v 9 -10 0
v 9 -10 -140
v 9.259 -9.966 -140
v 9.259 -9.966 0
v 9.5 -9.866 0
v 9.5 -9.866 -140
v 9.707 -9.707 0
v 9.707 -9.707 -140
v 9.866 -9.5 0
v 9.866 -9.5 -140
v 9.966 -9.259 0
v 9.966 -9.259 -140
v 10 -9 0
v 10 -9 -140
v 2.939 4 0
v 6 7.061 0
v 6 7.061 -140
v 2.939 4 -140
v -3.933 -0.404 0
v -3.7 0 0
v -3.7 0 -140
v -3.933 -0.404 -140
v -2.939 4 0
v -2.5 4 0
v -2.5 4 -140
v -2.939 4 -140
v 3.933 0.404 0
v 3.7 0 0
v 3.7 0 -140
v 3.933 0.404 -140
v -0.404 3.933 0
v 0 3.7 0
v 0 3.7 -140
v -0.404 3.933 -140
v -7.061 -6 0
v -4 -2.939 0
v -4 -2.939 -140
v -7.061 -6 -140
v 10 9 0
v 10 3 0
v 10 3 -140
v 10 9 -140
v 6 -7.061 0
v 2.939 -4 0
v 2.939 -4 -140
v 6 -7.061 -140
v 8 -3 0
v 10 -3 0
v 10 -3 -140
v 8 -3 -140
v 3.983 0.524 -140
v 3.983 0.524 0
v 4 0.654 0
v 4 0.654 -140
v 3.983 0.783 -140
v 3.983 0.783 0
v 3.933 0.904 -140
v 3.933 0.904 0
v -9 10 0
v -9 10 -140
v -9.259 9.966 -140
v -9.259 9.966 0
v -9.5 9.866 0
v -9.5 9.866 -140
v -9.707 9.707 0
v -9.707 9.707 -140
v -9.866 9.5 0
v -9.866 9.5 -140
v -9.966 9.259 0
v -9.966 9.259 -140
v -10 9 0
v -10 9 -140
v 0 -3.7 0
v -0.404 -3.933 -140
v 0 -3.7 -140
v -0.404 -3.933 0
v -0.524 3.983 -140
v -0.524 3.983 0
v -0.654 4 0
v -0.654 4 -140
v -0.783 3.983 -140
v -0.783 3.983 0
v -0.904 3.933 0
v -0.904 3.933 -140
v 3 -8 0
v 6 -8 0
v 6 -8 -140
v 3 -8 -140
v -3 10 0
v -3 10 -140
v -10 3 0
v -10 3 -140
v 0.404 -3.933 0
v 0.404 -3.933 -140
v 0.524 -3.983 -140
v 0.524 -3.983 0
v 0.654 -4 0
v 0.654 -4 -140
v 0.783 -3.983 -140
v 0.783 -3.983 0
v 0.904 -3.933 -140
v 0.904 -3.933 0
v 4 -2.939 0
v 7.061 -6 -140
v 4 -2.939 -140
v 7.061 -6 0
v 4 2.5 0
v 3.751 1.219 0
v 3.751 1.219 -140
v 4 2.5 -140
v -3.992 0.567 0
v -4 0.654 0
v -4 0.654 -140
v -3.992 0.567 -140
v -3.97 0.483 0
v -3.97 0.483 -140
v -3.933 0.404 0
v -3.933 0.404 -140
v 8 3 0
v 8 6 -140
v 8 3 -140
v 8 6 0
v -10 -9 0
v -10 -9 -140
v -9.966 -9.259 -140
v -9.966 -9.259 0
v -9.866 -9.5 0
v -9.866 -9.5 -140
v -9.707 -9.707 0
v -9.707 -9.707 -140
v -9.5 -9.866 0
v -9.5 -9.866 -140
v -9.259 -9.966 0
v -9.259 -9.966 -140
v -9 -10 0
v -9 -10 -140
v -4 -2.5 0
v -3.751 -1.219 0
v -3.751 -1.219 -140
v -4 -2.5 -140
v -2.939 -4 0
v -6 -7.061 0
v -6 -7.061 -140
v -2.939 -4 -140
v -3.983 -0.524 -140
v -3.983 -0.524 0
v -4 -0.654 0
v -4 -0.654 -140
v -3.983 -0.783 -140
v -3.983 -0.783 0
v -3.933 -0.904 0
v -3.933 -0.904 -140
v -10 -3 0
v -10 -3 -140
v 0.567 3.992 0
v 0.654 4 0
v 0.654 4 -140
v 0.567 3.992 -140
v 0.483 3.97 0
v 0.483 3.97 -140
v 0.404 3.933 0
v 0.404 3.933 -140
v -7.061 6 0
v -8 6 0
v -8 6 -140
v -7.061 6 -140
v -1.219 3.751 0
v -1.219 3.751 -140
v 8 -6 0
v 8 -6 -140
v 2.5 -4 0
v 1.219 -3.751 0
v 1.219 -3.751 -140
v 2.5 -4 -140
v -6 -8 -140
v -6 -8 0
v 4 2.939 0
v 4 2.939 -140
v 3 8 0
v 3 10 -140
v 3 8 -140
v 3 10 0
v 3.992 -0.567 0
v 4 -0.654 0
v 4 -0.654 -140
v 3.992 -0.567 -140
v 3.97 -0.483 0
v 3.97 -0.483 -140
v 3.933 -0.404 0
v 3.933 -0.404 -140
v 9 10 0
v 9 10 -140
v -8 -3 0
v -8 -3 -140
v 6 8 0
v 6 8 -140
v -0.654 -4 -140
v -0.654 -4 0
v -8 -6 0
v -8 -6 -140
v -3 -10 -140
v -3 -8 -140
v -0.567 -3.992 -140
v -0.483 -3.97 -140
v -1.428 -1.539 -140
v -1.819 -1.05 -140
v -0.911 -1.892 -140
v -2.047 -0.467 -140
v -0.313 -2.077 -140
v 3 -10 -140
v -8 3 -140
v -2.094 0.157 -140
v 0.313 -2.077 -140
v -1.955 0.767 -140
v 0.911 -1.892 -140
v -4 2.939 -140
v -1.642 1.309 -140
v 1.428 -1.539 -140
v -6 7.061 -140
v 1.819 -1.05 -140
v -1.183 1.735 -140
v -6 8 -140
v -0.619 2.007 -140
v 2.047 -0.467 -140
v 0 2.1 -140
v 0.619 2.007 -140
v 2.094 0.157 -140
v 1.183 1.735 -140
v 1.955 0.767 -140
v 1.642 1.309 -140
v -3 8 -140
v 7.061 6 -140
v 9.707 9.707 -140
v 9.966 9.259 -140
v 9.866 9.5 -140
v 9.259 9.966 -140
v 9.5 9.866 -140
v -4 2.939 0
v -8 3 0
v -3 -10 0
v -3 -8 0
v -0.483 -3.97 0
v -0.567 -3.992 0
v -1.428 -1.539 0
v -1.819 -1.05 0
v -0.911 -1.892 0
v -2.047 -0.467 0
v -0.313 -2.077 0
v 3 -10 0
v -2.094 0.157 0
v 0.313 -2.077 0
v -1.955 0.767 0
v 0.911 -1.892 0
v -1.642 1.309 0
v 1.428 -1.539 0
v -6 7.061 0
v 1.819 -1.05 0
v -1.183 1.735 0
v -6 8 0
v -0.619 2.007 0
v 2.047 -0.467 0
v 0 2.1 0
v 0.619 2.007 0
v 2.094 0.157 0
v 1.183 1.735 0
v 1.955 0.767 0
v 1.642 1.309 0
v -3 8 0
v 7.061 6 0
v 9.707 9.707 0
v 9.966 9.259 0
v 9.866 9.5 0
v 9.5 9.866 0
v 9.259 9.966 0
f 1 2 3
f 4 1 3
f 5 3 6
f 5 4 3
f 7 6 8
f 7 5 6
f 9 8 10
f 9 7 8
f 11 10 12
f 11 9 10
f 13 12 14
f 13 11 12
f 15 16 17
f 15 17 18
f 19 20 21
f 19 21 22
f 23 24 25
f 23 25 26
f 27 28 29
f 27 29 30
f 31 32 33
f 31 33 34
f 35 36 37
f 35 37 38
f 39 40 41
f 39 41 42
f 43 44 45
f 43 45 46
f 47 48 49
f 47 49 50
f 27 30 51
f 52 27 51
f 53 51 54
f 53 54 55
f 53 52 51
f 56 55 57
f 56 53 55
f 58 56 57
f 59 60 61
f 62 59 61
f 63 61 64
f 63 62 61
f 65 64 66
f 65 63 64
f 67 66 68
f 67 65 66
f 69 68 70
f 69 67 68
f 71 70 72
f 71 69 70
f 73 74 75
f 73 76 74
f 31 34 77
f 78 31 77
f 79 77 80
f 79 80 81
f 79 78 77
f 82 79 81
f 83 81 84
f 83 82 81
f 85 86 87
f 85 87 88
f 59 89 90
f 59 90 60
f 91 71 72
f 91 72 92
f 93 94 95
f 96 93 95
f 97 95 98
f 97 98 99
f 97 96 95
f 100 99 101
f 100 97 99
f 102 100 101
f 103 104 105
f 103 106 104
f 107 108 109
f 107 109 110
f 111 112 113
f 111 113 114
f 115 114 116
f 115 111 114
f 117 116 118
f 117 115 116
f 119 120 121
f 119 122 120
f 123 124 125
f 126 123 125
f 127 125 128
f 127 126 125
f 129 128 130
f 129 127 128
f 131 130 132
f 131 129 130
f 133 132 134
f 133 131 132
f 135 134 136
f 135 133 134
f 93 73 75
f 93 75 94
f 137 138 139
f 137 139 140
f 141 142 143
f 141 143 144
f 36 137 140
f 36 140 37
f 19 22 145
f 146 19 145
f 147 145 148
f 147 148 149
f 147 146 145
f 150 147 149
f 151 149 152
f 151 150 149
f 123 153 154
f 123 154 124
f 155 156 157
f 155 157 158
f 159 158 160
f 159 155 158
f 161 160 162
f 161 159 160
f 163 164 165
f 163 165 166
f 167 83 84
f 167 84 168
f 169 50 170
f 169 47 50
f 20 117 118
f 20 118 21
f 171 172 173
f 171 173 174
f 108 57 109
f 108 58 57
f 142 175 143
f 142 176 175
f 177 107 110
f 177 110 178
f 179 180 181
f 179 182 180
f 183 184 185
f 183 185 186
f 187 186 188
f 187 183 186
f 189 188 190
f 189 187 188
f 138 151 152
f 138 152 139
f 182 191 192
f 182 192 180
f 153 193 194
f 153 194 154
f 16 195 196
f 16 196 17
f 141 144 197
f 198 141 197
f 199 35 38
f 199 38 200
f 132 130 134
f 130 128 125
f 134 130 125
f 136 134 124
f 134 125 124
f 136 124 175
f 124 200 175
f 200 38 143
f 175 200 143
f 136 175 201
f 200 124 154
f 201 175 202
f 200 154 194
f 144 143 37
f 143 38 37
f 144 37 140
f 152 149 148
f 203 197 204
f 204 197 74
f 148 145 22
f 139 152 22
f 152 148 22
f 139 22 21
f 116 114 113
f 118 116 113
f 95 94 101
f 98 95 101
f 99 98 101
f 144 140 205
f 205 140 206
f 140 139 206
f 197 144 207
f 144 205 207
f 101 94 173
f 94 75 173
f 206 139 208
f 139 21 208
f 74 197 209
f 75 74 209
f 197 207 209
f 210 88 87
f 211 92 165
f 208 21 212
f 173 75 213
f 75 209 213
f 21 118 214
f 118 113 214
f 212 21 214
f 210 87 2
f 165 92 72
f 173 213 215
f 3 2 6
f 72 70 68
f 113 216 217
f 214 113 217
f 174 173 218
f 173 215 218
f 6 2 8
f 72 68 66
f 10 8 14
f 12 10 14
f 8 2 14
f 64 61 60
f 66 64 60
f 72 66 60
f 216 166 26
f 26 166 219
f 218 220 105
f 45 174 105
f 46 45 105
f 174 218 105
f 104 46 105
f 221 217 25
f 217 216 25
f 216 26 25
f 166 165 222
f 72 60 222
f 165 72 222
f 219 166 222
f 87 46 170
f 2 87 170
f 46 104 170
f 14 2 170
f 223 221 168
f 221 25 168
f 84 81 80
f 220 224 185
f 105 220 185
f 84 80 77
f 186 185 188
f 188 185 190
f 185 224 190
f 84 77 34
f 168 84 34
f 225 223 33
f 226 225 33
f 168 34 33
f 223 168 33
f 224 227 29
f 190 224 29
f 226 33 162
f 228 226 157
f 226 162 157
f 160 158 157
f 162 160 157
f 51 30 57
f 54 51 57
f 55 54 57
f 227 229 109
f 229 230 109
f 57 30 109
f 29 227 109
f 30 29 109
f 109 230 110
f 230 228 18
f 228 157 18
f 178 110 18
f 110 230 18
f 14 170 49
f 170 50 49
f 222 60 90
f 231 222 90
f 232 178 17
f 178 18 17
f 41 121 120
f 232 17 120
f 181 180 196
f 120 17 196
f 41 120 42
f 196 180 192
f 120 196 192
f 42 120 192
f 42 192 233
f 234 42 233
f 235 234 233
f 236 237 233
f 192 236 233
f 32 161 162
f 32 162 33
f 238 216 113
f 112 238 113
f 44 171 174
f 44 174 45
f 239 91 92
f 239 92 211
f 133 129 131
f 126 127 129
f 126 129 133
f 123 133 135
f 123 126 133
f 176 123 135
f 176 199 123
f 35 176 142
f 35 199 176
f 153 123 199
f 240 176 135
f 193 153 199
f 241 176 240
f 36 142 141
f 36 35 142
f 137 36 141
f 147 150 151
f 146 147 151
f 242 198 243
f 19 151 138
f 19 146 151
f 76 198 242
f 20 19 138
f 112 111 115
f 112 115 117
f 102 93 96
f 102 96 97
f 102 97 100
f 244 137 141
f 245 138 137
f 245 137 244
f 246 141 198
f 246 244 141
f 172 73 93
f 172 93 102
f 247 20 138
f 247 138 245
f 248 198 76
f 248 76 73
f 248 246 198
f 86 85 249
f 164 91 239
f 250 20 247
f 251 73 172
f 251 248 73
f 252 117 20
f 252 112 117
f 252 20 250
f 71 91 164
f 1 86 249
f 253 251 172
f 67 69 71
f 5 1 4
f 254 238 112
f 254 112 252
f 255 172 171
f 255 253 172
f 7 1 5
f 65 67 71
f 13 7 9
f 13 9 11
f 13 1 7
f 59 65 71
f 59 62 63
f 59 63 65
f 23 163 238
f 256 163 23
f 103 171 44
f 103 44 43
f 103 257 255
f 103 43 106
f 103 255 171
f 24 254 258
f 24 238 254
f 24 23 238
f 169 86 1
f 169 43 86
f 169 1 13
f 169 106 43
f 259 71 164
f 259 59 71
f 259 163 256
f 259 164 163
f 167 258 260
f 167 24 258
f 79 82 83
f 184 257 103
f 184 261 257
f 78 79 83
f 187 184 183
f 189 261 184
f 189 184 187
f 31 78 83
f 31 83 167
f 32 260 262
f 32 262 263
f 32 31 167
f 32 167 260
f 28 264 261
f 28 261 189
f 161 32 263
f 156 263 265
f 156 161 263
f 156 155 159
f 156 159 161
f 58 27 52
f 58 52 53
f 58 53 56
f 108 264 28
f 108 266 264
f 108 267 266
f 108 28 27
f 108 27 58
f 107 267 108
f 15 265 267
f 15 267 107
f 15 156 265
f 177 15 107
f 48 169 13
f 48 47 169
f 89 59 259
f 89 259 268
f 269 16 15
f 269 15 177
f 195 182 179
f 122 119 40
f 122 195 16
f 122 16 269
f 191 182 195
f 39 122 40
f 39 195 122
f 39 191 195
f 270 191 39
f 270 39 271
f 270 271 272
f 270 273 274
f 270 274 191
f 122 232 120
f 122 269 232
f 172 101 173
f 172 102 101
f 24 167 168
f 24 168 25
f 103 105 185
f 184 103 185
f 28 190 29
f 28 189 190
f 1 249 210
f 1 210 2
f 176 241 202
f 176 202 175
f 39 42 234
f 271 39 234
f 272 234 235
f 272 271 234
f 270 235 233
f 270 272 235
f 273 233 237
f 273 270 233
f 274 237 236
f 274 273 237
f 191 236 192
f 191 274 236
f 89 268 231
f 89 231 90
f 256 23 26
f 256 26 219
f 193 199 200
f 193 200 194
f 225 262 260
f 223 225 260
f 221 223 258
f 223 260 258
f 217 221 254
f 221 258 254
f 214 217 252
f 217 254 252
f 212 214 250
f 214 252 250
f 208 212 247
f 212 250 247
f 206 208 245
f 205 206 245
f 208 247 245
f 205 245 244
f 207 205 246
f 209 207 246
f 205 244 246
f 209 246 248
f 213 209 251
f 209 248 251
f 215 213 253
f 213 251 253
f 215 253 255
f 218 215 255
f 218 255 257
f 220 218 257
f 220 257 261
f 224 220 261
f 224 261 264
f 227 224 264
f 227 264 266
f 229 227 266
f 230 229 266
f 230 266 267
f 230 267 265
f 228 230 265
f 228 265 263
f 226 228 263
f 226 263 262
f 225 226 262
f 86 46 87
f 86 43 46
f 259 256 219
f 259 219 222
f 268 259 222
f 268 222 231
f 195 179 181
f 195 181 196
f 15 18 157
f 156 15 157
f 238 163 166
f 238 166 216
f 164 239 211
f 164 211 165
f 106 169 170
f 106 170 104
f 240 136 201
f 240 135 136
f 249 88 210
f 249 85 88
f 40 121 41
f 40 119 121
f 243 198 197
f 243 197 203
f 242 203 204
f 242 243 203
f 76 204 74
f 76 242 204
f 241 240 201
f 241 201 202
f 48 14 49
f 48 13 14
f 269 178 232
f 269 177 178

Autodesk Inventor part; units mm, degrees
ref_plane "YZ Plane" through (0, 0, 0) normal (1, 0, 0) x (0, 1, 0)
ref_plane "XZ Plane" through (0, 0, 0) normal (0, 1, 0) x (-1, 0, 0)
ref_plane "XY Plane" through (0, 0, 0) normal (0, 0, 1) x (1, 0, 0)
sketch "_____4" plane through (0, 0, 0) normal (0, 0, 1) x (1, 0, 0)
  line L0 (-10, -3) -> (-10, -9)
  arc A0 (-10, -9) -> (-9, -10) centre (-9, -9) ccw
  line L1 (-9, -10) -> (-3, -10)
  line L2 (-3, -10) -> (-3, -8)
  line L3 (-3, -8) -> (-6, -8)
  line L4 (-6, -8) -> (-6, -7.0607)
  line L5 (-6, -7.0607) -> (-2.9393, -4)
  line L6 (-2.9393, -4) -> (-0.6536, -4)
  arc A1 (-0.6536, -4) -> (-0.4036, -3.933) centre (-0.6536, -3.5) ccw
  line L7 (-0.4036, -3.933) -> (0, -3.7)
  line L8 (0, -3.7) -> (0.4036, -3.933)
  arc A2 (0.4036, -3.933) -> (0.9036, -3.933) centre (0.6536, -3.5) ccw
  line L9 (0.9036, -3.933) -> (1.2189, -3.751)
  line L10 (1.2189, -3.751) -> (2.5, -4)
  line L11 (2.5, -4) -> (2.9393, -4)
  line L12 (2.9393, -4) -> (6, -7.0607)
  line L13 (6, -7.0607) -> (6, -8)
  line L14 (6, -8) -> (3, -8)
  line L15 (3, -8) -> (3, -10)
  line L16 (3, -10) -> (9, -10)
  arc A3 (9, -10) -> (10, -9) centre (9, -9) ccw
  line L17 (10, -9) -> (10, -3)
  line L18 (10, -3) -> (8, -3)
  line L19 (8, -3) -> (8, -6)
  line L20 (8, -6) -> (7.0607, -6)
  line L21 (7.0607, -6) -> (4, -2.9393)
  line L22 (4, -2.9393) -> (4, -0.6536)
  arc A4 (4, -0.6536) -> (3.933, -0.4036) centre (3.5, -0.6536) ccw
  line L23 (3.933, -0.4036) -> (3.7, 0)
  line L24 (3.7, 0) -> (3.933, 0.4036)
  arc A5 (3.933, 0.4036) -> (3.933, 0.9036) centre (3.5, 0.6536) ccw
  line L25 (3.933, 0.9036) -> (3.751, 1.2189)
  line L26 (3.751, 1.2189) -> (4, 2.5)
  line L27 (4, 2.5) -> (4, 2.9393)
  line L28 (4, 2.9393) -> (7.0607, 6)
  line L29 (7.0607, 6) -> (8, 6)
  line L30 (8, 6) -> (8, 3)
  line L31 (8, 3) -> (10, 3)
  line L32 (10, 3) -> (10, 9)
  arc A6 (10, 9) -> (9, 10) centre (9, 9) ccw
  line L33 (9, 10) -> (3, 10)
  line L34 (3, 10) -> (3, 8)
  line L35 (3, 8) -> (6, 8)
  line L36 (6, 8) -> (6, 7.0607)
  line L37 (6, 7.0607) -> (2.9393, 4)
  line L38 (2.9393, 4) -> (0.6536, 4)
  arc A7 (0.6536, 4) -> (0.4036, 3.933) centre (0.6536, 3.5) ccw
  line L39 (0.4036, 3.933) -> (0, 3.7)
  line L40 (0, 3.7) -> (-0.4036, 3.933)
  arc A8 (-0.4036, 3.933) -> (-0.9036, 3.933) centre (-0.6536, 3.5) ccw
  line L41 (-0.9036, 3.933) -> (-1.2189, 3.751)
  line L42 (-1.2189, 3.751) -> (-2.5, 4)
  line L43 (-2.5, 4) -> (-2.9393, 4)
  line L44 (-2.9393, 4) -> (-6, 7.0607)
  line L45 (-6, 7.0607) -> (-6, 8)
  line L46 (-6, 8) -> (-3, 8)
  line L47 (-3, 8) -> (-3, 10)
  line L48 (-3, 10) -> (-9, 10)
  arc A9 (-9, 10) -> (-10, 9) centre (-9, 9) ccw
  line L49 (-10, 9) -> (-10, 3)
  line L50 (-10, 3) -> (-8, 3)
  line L51 (-8, 3) -> (-8, 6)
  line L52 (-8, 6) -> (-7.0607, 6)
  line L53 (-7.0607, 6) -> (-4, 2.9393)
  line L54 (-4, 2.9393) -> (-4, 0.6536)
  arc A10 (-4, 0.6536) -> (-3.933, 0.4036) centre (-3.5, 0.6536) ccw
  line L55 (-3.933, 0.4036) -> (-3.7, 0)
  line L56 (-3.7, 0) -> (-3.933, -0.4036)
  arc A11 (-3.933, -0.4036) -> (-3.933, -0.9036) centre (-3.5, -0.6536) ccw
  line L57 (-3.933, -0.9036) -> (-3.751, -1.2189)
  line L58 (-3.751, -1.2189) -> (-4, -2.5)
  line L59 (-4, -2.5) -> (-4, -2.9393)
  line L60 (-4, -2.9393) -> (-7.0607, -6)
  line L61 (-7.0607, -6) -> (-8, -6)
  line L62 (-8, -6) -> (-8, -3)
  line L63 (-8, -3) -> (-10, -3)
extrude "Extrusion1" add sketch "_____4" against normal blind 140
sketch "Sketch2" plane through (0, 0, -140) normal (0, 0, -1) x (-1, 0, 0)
  point P0 (0, 0)
hole "Hole1" at (0, 0, -140) direction (0, 0, 1) diameter 4.2 depth 4000
properties part number "KNFS5-2020-3" material "アルミニウム 6061"
